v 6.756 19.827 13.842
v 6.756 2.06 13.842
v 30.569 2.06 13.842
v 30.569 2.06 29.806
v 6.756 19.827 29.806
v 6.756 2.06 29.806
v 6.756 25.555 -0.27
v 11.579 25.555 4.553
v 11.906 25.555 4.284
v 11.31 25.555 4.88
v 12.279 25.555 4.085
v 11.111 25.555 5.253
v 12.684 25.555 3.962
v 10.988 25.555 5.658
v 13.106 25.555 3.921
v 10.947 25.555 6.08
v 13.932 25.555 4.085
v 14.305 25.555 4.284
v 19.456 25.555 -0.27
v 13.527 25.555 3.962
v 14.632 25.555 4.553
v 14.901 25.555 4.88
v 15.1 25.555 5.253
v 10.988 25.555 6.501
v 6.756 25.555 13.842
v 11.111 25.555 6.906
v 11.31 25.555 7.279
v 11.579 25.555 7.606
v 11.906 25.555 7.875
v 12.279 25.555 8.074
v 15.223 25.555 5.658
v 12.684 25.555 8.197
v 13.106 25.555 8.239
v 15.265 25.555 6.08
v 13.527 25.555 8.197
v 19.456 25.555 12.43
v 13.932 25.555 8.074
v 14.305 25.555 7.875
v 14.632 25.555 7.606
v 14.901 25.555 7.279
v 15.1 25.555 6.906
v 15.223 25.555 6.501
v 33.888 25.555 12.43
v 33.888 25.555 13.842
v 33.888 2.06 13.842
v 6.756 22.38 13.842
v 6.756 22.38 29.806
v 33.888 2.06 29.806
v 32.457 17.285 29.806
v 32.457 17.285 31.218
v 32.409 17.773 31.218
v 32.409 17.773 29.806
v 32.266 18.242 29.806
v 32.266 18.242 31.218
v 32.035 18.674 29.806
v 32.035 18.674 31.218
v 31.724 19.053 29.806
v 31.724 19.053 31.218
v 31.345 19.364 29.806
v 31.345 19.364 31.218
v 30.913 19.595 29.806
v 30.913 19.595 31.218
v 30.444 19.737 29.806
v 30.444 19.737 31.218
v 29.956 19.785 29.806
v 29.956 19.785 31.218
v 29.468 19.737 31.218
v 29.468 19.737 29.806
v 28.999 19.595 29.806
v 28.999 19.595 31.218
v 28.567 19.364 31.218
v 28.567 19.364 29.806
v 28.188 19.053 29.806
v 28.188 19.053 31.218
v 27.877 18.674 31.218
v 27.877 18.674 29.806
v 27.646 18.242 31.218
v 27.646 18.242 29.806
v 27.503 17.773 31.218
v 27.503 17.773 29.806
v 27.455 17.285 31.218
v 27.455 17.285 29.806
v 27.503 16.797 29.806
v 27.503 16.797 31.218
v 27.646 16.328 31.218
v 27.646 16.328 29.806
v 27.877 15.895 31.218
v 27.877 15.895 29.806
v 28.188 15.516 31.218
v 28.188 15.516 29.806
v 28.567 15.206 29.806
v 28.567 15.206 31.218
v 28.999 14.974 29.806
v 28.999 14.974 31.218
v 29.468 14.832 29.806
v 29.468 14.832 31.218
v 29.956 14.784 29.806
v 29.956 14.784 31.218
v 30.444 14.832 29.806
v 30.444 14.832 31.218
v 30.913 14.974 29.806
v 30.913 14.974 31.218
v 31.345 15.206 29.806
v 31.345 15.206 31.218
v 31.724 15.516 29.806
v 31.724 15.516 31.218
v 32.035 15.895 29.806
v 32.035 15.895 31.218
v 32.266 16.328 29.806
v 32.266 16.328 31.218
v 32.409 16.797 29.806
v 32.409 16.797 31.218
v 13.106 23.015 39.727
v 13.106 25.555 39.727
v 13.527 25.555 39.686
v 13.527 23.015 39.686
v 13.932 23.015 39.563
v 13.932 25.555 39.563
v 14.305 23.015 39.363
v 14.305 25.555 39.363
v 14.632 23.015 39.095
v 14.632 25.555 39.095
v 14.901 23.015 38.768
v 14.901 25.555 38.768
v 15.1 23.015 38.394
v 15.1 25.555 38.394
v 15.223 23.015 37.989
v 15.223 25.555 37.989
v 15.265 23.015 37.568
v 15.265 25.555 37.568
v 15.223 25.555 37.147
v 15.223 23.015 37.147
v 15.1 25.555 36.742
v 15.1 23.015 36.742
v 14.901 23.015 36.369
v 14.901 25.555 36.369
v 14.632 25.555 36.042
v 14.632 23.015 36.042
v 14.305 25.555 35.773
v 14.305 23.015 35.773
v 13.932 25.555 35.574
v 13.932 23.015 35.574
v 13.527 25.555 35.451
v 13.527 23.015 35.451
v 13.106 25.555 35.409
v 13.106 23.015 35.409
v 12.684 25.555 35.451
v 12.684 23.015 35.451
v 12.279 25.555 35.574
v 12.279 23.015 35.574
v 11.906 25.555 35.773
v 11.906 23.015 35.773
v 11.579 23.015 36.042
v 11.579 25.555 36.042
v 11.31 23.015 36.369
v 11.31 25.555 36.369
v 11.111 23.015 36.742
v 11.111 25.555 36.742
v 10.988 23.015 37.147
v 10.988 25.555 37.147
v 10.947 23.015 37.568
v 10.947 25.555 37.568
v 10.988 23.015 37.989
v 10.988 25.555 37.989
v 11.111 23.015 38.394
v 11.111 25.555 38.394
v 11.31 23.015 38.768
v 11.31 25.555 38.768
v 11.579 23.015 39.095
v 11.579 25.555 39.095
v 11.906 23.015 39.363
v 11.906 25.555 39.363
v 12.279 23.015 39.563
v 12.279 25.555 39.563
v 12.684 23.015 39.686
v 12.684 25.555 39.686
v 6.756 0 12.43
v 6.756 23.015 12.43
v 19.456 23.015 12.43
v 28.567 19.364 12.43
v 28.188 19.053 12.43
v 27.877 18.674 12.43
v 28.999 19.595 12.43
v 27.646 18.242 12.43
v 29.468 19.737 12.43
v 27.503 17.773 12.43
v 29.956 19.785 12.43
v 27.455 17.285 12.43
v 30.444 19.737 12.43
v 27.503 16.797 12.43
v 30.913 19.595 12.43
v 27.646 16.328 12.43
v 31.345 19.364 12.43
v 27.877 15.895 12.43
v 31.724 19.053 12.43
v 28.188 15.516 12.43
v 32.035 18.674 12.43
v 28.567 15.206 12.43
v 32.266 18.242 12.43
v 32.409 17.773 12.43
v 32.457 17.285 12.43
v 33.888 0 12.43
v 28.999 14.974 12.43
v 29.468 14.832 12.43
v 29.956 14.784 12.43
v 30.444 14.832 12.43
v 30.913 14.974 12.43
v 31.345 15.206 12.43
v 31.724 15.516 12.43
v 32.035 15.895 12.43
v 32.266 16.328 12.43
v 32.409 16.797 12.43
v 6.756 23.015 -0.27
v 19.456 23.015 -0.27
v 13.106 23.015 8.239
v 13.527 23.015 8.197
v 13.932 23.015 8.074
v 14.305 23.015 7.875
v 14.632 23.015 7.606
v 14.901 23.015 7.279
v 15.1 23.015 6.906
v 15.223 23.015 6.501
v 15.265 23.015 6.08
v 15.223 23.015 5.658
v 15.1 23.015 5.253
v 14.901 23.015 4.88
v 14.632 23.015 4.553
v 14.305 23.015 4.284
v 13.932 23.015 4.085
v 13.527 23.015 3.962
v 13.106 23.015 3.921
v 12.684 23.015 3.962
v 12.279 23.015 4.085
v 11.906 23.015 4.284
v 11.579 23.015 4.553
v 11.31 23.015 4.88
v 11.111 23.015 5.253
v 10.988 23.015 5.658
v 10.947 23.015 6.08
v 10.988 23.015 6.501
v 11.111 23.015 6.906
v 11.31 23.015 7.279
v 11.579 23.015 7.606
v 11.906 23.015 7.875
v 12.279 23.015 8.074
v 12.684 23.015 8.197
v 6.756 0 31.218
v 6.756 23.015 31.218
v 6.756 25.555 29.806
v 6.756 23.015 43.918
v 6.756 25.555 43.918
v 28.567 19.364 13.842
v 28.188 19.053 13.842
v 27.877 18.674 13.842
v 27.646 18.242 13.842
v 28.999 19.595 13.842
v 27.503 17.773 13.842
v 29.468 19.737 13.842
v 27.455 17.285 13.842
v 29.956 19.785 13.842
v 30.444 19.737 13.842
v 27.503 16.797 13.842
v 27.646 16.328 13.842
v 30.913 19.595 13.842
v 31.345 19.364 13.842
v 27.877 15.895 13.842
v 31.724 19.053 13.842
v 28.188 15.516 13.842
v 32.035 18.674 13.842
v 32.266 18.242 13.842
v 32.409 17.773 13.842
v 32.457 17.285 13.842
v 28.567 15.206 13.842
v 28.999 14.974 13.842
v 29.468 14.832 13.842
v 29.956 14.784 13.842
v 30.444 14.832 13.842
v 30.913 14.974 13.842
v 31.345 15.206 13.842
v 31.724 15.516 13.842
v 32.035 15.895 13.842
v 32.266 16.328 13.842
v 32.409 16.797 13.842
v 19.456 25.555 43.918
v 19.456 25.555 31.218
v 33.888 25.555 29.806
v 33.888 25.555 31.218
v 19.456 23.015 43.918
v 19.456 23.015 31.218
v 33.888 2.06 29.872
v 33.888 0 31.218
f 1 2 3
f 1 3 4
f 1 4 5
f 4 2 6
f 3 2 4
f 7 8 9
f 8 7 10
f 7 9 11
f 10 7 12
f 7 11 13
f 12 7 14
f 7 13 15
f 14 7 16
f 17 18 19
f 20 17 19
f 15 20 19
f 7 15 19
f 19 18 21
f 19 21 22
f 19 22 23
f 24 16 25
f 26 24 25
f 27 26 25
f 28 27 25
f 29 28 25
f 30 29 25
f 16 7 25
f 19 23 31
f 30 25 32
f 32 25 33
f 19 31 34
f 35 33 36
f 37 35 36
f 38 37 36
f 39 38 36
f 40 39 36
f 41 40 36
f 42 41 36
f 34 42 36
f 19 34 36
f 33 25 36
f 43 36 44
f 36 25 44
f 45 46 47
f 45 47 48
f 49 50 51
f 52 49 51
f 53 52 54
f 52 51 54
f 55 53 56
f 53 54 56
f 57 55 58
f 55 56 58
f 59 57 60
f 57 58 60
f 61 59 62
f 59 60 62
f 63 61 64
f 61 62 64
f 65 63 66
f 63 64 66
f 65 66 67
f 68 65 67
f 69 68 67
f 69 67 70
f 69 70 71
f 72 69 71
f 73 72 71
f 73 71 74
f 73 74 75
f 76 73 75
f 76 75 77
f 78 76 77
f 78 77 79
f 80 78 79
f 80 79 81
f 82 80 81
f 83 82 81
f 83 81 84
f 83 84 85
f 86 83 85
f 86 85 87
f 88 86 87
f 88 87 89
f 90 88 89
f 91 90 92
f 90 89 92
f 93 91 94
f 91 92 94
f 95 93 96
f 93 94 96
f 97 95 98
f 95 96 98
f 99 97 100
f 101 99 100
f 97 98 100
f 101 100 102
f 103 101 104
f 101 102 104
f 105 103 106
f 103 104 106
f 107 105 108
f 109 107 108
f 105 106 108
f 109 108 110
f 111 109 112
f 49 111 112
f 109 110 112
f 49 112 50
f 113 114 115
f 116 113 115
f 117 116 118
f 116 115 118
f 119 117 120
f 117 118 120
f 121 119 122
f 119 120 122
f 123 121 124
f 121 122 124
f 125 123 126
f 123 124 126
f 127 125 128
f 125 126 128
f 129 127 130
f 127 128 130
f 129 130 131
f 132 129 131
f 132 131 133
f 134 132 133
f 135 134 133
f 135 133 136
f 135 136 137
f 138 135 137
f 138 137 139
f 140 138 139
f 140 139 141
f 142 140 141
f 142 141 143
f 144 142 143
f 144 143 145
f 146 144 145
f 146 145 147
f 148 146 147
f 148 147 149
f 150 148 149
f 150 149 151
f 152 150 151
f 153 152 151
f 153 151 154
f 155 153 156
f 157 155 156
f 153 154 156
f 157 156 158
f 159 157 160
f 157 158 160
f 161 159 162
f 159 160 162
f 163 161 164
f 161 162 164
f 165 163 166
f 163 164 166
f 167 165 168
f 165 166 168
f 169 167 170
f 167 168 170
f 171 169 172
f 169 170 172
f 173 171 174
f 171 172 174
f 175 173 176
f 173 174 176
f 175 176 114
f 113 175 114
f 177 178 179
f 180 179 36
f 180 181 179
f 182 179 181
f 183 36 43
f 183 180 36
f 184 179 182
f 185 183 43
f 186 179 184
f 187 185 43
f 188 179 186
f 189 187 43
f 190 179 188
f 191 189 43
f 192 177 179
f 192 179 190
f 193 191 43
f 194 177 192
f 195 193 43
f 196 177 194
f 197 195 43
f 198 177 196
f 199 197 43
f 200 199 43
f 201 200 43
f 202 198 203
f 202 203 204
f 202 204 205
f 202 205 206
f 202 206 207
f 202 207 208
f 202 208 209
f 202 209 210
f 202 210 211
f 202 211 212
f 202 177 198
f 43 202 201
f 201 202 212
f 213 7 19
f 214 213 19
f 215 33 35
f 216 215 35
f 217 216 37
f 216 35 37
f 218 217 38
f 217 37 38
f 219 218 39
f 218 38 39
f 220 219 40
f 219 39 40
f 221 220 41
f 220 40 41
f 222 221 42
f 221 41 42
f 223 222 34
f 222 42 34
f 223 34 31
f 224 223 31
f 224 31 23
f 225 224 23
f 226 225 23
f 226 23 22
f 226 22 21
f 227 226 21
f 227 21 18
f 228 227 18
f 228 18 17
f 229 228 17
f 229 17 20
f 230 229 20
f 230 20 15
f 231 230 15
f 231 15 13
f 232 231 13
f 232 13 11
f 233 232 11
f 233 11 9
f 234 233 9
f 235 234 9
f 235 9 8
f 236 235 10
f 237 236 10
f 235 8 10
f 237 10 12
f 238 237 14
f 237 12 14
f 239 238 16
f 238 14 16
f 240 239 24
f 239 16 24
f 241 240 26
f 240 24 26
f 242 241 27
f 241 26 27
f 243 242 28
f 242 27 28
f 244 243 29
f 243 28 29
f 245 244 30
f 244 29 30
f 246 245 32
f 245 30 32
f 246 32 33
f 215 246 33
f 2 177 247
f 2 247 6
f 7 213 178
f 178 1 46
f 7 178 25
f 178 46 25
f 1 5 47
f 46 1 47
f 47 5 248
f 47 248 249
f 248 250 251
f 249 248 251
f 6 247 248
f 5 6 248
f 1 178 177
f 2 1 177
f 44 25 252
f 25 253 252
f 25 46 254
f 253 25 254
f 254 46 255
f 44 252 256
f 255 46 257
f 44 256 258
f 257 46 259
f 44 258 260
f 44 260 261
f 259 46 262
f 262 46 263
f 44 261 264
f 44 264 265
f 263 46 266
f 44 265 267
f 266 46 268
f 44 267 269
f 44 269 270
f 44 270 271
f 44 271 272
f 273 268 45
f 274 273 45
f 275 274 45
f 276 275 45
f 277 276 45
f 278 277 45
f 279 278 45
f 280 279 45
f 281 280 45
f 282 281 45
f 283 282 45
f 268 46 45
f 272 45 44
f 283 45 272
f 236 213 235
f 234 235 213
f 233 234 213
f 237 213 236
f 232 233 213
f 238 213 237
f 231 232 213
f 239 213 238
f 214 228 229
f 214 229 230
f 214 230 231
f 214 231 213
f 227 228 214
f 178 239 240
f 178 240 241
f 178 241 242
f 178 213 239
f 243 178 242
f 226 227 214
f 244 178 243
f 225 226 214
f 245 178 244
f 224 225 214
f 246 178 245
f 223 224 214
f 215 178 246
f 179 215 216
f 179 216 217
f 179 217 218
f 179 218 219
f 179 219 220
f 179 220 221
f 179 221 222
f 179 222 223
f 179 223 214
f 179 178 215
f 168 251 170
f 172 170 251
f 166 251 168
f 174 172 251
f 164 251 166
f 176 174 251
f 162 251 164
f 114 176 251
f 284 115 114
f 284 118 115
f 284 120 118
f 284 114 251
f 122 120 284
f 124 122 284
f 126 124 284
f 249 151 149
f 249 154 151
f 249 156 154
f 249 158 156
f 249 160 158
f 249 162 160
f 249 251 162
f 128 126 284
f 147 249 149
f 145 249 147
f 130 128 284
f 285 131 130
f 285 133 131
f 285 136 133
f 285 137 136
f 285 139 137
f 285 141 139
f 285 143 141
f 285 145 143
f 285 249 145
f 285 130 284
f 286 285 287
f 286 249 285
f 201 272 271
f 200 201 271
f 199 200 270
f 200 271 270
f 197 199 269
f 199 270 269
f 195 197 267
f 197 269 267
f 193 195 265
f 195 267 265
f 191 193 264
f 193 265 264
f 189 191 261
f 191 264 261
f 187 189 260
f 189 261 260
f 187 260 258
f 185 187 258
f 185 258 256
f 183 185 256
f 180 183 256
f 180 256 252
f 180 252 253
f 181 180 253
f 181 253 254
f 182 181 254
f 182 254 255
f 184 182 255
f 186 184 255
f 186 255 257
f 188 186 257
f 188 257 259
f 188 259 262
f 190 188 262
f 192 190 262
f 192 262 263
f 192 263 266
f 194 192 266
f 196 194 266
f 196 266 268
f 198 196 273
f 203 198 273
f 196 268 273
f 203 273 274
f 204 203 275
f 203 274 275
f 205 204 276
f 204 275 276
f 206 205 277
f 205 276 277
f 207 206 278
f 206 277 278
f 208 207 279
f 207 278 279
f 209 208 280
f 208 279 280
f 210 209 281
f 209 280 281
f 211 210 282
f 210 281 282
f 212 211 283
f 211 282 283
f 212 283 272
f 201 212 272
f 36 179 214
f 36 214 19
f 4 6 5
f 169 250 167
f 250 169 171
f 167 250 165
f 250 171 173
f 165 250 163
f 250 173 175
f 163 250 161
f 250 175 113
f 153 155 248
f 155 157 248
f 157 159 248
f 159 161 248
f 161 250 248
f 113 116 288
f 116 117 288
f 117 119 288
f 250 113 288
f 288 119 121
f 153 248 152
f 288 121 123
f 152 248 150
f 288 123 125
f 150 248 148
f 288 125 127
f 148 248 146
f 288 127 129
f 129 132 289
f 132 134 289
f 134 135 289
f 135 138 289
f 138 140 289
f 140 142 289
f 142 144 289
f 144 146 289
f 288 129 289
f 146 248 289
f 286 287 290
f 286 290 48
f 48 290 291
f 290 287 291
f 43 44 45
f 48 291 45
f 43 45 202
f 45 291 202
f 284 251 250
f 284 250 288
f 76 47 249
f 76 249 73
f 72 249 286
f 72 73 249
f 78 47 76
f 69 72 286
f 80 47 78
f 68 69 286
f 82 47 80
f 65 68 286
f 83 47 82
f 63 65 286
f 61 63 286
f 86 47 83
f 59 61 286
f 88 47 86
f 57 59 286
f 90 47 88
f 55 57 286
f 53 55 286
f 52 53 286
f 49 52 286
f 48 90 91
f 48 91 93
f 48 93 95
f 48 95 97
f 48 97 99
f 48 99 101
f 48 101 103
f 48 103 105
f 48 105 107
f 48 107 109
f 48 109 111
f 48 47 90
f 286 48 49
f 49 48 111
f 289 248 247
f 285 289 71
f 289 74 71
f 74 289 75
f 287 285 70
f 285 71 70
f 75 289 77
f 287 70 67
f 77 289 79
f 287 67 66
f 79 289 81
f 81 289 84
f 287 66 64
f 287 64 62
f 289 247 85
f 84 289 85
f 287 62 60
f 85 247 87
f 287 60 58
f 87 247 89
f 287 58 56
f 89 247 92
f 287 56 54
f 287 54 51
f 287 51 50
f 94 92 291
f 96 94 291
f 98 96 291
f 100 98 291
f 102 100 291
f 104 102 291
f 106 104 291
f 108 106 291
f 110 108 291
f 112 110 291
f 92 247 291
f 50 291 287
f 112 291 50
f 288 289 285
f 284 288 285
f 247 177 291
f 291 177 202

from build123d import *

# Parameters (mm, degrees)
BOSS_EXTRUDE6_DEPTH  = 2.05994
SKETCH9_W            = 27.13228
SKETCH9_H            = 1.41224
BOSS_EXTRUDE7_DEPTH  = 20.32
SKETCH10_R           = 2.50063
CUT_EXTRUDE3_DEPTH   = 25.4
BOSS_EXTRUDE10_DEPTH = 16.02994
SKETCH15_W           = 51.72964
SKETCH15_H           = 37.846
CUT_EXTRUDE5_DEPTH   = 64.999044225
SKETCH16_W           = 27.13228
SKETCH16_H           = 1.41224
BOSS_EXTRUDE11_DEPTH = 3.175
SKETCH18_W           = 12.7
SKETCH18_H           = 2.54
BOSS_EXTRUDE12_DEPTH = 12.7
SKETCH19_R           = 2.159
CUT_EXTRUDE6_DEPTH   = 62.075806811


with BuildPart() as part:
    # Sketch8 → Boss-Extrude6 (new body)
    with BuildSketch(Plane(origin=(0, 0, 0), x_dir=(1, 0, 0), z_dir=(0, 1, 0))):
        Polygon((-44.974060072, -2.900891689), (-44.974060072, -40.746891689), (2.165799928, -40.746891689), (2.165799928, -35.808024144), (6.755579928, -31.218244144), (33.887859928, -31.218244144), (33.887859928, -12.429539234), (6.755579928, -12.429539234), (2.165799928, -7.839759234), (2.165799928, -2.900891689), align=None)
    extrude(amount=BOSS_EXTRUDE6_DEPTH)

    # Sketch9 → Boss-Extrude7 (add)
    with BuildSketch(Plane(origin=(0, 2.05994, 0), x_dir=(1, 0, 0), z_dir=(0, 1, 0))):
        with Locations((20.321719928, -13.135659234)):
            Rectangle(SKETCH9_W, SKETCH9_H)
        with Locations((20.321719928, -30.512124144)):
            Rectangle(SKETCH9_W, SKETCH9_H)
    extrude(amount=BOSS_EXTRUDE7_DEPTH)

    # Sketch10 → Cut-Extrude3 (cut)
    with BuildSketch(Plane.XY.offset(31.218244144)):
        with Locations((29.955939928, 17.2847)):
            Circle(SKETCH10_R)
    extrude(amount=-CUT_EXTRUDE3_DEPTH, mode=Mode.SUBTRACT)

    # Sketch14 → Boss-Extrude10 (add)
    with BuildSketch(Plane.XY.offset(13.841779234)):
        Polygon((6.755579928, 22.37994), (33.887859928, 2.05994), (30.568919609, 2.05994), (6.755579928, 19.826826768), align=None)
    extrude(amount=BOSS_EXTRUDE10_DEPTH)

    # Sketch15 → Cut-Extrude5 (cut, through all)
    with BuildSketch(Plane(origin=(0, 2.05994, 0), x_dir=(1, 0, 0), z_dir=(0, 1, 0))):
        with Locations((-19.109240072, -21.823891689)):
            Rectangle(SKETCH15_W, SKETCH15_H)
    extrude(amount=-CUT_EXTRUDE5_DEPTH, mode=Mode.SUBTRACT)

    # Sketch16 → Boss-Extrude11 (add)
    with BuildSketch(Plane(origin=(0, 22.37994, 0), x_dir=(1, 0, 0), z_dir=(0, 1, 0))):
        with Locations((20.321719928, -30.512124144)):
            Rectangle(SKETCH16_W, SKETCH16_H)
        with Locations((20.321719928, -13.135659234)):
            Rectangle(SKETCH16_W, SKETCH16_H)
    extrude(amount=BOSS_EXTRUDE11_DEPTH)

    # Sketch18 → Boss-Extrude12 (add)
    with BuildSketch(Plane.XY.offset(31.218244144)):
        with Locations((13.105579928, 24.28494)):
            Rectangle(SKETCH18_W, SKETCH18_H)
    boss_extrude12 = extrude(amount=BOSS_EXTRUDE12_DEPTH)

    # Mirror1: Boss-Extrude12 across plane
    add(boss_extrude12.mirror(Plane.XY.offset(21.823891689)))

    # Sketch19 → Cut-Extrude6 (cut, through all)
    with BuildSketch(Plane(origin=(0, 25.55494, 0), x_dir=(1, 0, 0), z_dir=(0, 1, 0))):
        with Locations(Location((13.105579928, -6.079539234, 0), (0, 0, 270))):
            Circle(SKETCH19_R)
        with Locations(Location((13.105579928, -37.568244144, 0), (0, 0, 270))):
            Circle(SKETCH19_R)
    extrude(amount=-CUT_EXTRUDE6_DEPTH, mode=Mode.SUBTRACT)


solid = part.part
